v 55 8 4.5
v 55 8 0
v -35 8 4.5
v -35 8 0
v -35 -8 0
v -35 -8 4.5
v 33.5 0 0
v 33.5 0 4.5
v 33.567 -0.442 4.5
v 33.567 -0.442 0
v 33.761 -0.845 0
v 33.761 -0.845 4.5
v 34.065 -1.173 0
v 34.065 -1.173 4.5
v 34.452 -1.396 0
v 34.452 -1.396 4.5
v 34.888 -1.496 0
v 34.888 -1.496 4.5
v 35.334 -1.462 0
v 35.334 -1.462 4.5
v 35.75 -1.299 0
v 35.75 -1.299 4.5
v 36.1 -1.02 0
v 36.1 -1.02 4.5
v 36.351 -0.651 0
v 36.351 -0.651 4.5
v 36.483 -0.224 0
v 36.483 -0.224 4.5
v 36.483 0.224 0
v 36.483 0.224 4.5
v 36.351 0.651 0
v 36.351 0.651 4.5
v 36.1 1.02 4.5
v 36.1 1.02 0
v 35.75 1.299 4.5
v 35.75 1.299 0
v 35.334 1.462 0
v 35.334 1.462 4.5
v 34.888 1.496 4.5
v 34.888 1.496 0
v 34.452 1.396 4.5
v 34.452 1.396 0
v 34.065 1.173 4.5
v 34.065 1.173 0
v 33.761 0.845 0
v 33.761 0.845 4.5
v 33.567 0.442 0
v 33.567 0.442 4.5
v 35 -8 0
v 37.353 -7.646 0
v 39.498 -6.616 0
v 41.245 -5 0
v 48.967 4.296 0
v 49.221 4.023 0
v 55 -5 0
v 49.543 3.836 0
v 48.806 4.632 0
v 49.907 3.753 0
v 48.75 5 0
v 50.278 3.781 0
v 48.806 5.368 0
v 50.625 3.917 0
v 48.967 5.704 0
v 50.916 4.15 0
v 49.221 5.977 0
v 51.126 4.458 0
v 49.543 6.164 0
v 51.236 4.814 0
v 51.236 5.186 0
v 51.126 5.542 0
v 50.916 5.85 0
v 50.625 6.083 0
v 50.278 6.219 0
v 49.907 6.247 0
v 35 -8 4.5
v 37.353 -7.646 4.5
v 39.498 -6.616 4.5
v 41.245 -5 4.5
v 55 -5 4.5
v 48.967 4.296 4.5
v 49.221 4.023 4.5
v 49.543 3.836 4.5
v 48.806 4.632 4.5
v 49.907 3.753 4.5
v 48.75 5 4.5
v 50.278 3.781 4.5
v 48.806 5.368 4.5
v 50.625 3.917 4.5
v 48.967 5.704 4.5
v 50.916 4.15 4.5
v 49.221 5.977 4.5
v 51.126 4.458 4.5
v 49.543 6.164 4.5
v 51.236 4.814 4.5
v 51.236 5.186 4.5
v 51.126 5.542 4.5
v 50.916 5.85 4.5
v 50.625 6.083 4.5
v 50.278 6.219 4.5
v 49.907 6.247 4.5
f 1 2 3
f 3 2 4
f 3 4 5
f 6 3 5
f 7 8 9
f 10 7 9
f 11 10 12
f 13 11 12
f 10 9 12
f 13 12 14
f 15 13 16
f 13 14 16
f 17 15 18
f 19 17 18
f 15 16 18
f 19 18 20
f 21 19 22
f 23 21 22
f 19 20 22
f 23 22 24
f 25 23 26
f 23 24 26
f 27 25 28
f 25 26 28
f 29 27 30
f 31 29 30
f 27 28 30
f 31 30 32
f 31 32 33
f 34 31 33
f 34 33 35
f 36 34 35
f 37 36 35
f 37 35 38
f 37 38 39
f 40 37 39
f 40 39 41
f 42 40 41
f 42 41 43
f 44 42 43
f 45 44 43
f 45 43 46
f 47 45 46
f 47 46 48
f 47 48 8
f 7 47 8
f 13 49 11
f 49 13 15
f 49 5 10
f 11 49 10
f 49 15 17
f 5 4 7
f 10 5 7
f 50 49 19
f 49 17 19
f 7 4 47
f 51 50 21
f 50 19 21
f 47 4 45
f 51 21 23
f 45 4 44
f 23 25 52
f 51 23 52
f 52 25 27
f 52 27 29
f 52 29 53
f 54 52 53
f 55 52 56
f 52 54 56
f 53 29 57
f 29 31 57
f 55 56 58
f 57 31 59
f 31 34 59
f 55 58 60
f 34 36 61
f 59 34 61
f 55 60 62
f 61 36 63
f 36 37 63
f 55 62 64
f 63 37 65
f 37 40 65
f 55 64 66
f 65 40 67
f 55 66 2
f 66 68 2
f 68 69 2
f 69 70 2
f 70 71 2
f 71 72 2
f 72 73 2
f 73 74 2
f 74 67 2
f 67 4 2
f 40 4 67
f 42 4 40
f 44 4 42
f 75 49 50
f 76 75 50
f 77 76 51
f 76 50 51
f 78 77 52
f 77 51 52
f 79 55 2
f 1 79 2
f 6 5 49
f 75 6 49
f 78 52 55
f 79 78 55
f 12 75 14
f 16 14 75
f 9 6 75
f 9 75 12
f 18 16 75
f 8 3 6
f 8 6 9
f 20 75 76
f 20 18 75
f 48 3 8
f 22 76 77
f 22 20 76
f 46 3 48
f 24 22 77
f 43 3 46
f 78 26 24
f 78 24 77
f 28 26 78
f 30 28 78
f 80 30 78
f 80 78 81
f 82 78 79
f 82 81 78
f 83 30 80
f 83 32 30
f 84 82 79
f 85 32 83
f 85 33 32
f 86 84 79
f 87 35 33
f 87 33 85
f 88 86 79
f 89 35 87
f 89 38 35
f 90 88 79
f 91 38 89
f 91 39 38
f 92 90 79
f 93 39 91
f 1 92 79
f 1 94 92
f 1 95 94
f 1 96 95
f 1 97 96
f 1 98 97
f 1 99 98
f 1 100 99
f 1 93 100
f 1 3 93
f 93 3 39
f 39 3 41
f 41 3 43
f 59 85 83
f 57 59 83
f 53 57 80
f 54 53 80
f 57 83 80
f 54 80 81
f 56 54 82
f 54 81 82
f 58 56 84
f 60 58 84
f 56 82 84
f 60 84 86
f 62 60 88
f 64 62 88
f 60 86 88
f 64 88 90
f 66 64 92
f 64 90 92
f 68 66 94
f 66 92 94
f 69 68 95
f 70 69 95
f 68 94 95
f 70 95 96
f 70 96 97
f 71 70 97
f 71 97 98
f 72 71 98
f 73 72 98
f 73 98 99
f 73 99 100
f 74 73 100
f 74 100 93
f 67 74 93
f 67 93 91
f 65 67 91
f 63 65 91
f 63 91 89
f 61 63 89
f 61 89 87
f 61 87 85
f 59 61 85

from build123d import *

# Parameters (mm, degrees)
F1_DEPTH = 4.5
F2_D     = 3
F2_DEPTH = 10
F2_TIP   = 0.9012909285
F3_D     = 2.5
F3_DEPTH = 10
F3_TIP   = 0.7510757738


with BuildPart() as f1:
    # F0 (on Top) → F1 (new body)
    with BuildSketch(Plane.XY):
        Polygon((35, -5), (35, 8), (-35, 8), (-35, -8), (35, -8), align=None)
        with BuildLine():
            Line((41.2449979984, -5), (35, -5))
            Line((35, -5), (35, -8))
            ThreePointArc((35, -8), (38.4641016151, -7.2111025509), (41.2449979984, -5))
        make_face()
        with BuildLine():
            ThreePointArc((41.2449979984, -5), (42.2111025509, 3.4641016151), (35, 8))
            Line((35, 8), (35, -5))
            Line((35, -5), (41.2449979984, -5))
        make_face()
        with BuildLine():
            Line((55, 8), (35, 8))
            ThreePointArc((35, 8), (42.2111025509, 3.4641016151), (41.2449979984, -5))
            Line((41.2449979984, -5), (55, -5))
            Line((55, -5), (55, 8))
        make_face()
    extrude(amount=F1_DEPTH)

    # F2
    with Locations(Plane(origin=(0, 0, 0), x_dir=(1, 0, 0), z_dir=(0, 0, -1))):
        with Locations((35, 0)):
            Hole(F2_D / 2, depth=F2_DEPTH)
            with Locations((0, 0, -(F2_DEPTH + F2_TIP / 2))):  # 118° drill point
                Cone(0, F2_D / 2, F2_TIP, mode=Mode.SUBTRACT)

    # F3
    with Locations(Plane(origin=(0, 0, 0), x_dir=(1, 0, 0), z_dir=(0, 0, -1))):
        with Locations((50, -5)):
            Hole(F3_D / 2, depth=F3_DEPTH)
            with Locations((0, 0, -(F3_DEPTH + F3_TIP / 2))):  # 118° drill point
                Cone(0, F3_D / 2, F3_TIP, mode=Mode.SUBTRACT)


solid = f1.part
